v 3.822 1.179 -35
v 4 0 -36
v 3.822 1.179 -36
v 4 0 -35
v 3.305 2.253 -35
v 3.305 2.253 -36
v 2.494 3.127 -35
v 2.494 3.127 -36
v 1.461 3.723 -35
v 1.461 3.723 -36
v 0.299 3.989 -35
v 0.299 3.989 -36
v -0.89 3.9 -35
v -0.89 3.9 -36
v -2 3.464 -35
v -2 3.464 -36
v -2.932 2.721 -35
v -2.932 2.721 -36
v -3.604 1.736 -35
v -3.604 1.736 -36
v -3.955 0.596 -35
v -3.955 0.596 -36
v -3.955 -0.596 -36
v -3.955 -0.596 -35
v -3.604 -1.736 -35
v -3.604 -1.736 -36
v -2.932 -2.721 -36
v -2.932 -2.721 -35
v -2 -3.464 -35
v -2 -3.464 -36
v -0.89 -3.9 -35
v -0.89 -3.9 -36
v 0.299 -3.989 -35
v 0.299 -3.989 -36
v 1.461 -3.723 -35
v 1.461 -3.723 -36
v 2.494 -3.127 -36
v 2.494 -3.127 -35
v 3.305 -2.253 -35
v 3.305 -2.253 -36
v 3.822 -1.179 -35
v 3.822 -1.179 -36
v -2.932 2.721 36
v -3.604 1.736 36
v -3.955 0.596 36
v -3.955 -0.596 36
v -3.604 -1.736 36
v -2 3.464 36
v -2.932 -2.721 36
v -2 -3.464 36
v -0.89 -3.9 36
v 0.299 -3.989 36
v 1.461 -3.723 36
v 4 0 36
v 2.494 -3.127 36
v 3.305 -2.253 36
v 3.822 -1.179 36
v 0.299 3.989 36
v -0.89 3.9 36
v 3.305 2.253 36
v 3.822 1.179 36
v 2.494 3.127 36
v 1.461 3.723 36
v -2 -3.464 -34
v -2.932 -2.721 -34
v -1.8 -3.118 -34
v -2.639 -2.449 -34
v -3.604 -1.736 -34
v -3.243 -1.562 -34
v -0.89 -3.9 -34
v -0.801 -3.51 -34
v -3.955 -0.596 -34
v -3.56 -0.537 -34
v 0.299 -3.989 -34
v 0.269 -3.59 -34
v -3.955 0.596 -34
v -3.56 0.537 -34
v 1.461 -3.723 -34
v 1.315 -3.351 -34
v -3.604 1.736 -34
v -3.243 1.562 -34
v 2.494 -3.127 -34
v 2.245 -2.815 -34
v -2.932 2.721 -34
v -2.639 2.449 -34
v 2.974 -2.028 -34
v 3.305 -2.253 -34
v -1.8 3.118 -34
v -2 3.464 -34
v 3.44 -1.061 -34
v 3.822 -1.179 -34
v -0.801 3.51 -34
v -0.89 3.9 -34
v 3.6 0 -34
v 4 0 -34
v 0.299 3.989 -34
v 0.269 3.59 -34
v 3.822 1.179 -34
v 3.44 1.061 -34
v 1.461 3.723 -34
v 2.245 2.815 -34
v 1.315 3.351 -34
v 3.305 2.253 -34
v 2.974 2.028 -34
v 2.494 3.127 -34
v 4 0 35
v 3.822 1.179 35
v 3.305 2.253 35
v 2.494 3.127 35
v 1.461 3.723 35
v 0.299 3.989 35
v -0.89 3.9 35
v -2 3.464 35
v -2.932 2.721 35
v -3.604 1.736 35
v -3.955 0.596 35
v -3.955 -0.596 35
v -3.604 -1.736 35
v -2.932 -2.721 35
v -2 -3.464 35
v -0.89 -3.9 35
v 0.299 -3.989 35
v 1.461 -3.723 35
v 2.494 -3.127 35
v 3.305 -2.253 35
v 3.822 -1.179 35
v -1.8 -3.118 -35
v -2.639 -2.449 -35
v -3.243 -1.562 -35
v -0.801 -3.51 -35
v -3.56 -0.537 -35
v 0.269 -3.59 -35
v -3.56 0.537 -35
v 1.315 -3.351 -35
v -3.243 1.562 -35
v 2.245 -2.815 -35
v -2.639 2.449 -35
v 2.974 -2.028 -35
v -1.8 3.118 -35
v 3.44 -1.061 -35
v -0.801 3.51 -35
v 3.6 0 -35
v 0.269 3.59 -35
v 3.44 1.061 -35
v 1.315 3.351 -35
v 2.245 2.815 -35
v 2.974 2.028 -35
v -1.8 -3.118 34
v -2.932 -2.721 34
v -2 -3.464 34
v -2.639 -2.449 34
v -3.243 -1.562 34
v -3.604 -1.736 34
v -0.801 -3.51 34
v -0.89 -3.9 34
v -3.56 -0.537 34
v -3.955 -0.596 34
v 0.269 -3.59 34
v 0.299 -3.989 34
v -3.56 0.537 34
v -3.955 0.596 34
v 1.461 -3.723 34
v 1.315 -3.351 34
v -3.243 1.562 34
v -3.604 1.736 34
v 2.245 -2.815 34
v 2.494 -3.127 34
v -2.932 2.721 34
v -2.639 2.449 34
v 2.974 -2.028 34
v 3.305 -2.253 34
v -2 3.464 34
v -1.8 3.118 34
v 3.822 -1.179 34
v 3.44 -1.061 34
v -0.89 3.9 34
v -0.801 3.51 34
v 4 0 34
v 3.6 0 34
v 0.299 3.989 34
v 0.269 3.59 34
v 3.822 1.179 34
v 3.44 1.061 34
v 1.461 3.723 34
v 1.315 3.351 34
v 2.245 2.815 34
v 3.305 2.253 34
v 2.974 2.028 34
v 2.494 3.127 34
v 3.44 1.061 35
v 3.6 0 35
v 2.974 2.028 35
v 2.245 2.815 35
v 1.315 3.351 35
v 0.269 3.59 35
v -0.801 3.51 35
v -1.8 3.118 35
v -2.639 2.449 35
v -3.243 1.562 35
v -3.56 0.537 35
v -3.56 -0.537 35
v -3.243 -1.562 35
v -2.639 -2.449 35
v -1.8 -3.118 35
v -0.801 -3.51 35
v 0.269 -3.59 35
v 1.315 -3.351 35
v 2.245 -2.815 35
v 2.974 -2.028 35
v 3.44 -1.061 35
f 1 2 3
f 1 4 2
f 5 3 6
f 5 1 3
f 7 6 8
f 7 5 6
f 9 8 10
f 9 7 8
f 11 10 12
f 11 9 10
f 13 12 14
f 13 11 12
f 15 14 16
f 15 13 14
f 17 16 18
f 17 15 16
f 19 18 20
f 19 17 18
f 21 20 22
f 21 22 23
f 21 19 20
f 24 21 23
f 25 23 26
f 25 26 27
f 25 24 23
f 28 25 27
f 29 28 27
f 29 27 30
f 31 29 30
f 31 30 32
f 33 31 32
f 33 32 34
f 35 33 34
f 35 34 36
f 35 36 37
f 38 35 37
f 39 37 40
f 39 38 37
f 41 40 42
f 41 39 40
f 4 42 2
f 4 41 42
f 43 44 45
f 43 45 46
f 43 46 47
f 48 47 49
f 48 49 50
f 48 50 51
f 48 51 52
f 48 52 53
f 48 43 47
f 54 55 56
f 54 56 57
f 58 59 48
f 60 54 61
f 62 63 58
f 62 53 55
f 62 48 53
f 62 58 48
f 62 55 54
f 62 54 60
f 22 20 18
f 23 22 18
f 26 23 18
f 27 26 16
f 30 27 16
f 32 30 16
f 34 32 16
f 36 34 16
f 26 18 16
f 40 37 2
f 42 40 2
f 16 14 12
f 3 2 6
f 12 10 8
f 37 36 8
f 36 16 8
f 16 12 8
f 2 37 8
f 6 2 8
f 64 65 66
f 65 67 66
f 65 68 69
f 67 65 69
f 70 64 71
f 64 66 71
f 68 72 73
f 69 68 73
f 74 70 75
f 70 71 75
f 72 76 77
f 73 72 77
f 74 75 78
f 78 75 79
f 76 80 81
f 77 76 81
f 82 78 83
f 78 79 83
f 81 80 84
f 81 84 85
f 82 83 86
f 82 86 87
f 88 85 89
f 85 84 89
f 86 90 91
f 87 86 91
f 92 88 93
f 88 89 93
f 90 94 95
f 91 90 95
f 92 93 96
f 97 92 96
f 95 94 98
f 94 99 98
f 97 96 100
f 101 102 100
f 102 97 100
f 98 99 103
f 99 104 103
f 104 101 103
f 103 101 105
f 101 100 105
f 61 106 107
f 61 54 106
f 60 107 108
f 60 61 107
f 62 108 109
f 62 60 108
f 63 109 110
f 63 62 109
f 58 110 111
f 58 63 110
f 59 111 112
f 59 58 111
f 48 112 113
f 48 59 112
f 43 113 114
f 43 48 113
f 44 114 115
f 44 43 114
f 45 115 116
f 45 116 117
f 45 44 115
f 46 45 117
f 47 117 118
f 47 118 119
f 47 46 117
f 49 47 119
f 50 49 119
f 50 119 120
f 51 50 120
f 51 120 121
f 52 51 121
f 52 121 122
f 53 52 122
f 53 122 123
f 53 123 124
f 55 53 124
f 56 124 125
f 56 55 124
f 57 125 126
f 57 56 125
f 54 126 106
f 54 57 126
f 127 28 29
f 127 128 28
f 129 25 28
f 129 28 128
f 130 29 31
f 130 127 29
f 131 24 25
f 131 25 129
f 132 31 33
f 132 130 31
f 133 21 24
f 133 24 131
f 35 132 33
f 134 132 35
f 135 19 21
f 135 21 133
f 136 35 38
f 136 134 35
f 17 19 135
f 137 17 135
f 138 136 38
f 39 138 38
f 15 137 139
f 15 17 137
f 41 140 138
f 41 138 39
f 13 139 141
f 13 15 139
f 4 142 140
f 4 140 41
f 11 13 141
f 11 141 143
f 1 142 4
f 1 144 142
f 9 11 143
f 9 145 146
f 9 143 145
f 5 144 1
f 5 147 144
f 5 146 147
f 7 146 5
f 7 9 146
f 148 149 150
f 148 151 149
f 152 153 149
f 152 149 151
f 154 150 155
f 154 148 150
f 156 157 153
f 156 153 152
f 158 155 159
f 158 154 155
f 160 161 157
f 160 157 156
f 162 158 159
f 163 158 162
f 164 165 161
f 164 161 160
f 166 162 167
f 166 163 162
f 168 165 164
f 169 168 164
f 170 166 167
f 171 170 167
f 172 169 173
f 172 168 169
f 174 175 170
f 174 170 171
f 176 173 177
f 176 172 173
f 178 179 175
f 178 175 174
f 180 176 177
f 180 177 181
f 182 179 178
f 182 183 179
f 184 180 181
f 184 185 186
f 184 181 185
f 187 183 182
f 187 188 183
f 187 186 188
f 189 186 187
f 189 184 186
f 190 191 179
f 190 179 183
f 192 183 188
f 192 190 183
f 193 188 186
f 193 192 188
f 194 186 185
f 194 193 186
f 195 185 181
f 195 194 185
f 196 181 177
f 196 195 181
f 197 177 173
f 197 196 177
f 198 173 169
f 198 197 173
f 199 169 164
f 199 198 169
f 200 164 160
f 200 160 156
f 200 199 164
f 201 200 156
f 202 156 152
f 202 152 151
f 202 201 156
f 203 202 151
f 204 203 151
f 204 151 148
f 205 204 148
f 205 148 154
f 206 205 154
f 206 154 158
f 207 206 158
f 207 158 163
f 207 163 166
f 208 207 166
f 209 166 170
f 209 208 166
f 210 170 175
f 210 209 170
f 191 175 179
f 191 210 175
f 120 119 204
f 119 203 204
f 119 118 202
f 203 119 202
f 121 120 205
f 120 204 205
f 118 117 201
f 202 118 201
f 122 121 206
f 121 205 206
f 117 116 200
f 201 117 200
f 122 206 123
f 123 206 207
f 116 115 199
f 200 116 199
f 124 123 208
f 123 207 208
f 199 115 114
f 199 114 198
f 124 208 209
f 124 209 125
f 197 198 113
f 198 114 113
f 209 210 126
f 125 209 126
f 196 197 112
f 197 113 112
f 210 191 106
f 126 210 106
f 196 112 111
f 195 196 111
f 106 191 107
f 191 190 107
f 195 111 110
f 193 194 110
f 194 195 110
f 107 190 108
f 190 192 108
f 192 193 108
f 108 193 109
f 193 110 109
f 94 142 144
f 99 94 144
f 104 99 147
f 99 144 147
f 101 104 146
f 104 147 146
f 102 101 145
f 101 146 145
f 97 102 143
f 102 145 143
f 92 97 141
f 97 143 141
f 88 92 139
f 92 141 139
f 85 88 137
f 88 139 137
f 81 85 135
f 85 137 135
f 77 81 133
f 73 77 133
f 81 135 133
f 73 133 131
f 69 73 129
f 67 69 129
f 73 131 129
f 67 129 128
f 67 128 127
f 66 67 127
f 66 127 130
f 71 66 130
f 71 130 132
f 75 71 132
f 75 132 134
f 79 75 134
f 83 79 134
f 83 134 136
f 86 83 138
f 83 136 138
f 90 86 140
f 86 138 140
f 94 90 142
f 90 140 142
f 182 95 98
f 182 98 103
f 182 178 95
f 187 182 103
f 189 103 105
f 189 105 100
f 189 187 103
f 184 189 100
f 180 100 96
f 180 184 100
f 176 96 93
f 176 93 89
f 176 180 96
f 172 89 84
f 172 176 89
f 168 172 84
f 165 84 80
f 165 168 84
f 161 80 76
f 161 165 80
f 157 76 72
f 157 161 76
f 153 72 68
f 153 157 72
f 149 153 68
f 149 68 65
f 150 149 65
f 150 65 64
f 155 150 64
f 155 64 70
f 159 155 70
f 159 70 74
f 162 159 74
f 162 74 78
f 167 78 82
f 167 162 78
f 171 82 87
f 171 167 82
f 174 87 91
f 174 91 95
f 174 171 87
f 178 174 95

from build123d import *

# Parameters (mm, degrees)
SKETCH_1_R          = 4
EXTRUDE_1_DEPTH     = 36
CUT_EXTRUDE_START   = 1
SKETCH_2_R          = 4
SKETCH_2_R_2        = 3.6
CUT_EXTRUDE_1_DEPTH = 1


with BuildPart() as part:
    # 草图1 → 凸台-拉伸1 (new, symmetric)
    with BuildSketch(Plane.XY):
        Circle(SKETCH_1_R)
    extrude(amount=EXTRUDE_1_DEPTH, both=True)

    # 草图2 → 切除-拉伸1 (cut)
    with BuildSketch(Plane.XY.offset(34).offset(CUT_EXTRUDE_START)):
        Circle(SKETCH_2_R)
        Circle(SKETCH_2_R_2, mode=Mode.SUBTRACT)
    cut_extrude_1 = extrude(amount=-CUT_EXTRUDE_1_DEPTH, mode=Mode.SUBTRACT)

    # 镜向1: 切除-拉伸1 across plane
    add(cut_extrude_1.mirror(Plane.XY), mode=Mode.SUBTRACT)


solid = part.part
